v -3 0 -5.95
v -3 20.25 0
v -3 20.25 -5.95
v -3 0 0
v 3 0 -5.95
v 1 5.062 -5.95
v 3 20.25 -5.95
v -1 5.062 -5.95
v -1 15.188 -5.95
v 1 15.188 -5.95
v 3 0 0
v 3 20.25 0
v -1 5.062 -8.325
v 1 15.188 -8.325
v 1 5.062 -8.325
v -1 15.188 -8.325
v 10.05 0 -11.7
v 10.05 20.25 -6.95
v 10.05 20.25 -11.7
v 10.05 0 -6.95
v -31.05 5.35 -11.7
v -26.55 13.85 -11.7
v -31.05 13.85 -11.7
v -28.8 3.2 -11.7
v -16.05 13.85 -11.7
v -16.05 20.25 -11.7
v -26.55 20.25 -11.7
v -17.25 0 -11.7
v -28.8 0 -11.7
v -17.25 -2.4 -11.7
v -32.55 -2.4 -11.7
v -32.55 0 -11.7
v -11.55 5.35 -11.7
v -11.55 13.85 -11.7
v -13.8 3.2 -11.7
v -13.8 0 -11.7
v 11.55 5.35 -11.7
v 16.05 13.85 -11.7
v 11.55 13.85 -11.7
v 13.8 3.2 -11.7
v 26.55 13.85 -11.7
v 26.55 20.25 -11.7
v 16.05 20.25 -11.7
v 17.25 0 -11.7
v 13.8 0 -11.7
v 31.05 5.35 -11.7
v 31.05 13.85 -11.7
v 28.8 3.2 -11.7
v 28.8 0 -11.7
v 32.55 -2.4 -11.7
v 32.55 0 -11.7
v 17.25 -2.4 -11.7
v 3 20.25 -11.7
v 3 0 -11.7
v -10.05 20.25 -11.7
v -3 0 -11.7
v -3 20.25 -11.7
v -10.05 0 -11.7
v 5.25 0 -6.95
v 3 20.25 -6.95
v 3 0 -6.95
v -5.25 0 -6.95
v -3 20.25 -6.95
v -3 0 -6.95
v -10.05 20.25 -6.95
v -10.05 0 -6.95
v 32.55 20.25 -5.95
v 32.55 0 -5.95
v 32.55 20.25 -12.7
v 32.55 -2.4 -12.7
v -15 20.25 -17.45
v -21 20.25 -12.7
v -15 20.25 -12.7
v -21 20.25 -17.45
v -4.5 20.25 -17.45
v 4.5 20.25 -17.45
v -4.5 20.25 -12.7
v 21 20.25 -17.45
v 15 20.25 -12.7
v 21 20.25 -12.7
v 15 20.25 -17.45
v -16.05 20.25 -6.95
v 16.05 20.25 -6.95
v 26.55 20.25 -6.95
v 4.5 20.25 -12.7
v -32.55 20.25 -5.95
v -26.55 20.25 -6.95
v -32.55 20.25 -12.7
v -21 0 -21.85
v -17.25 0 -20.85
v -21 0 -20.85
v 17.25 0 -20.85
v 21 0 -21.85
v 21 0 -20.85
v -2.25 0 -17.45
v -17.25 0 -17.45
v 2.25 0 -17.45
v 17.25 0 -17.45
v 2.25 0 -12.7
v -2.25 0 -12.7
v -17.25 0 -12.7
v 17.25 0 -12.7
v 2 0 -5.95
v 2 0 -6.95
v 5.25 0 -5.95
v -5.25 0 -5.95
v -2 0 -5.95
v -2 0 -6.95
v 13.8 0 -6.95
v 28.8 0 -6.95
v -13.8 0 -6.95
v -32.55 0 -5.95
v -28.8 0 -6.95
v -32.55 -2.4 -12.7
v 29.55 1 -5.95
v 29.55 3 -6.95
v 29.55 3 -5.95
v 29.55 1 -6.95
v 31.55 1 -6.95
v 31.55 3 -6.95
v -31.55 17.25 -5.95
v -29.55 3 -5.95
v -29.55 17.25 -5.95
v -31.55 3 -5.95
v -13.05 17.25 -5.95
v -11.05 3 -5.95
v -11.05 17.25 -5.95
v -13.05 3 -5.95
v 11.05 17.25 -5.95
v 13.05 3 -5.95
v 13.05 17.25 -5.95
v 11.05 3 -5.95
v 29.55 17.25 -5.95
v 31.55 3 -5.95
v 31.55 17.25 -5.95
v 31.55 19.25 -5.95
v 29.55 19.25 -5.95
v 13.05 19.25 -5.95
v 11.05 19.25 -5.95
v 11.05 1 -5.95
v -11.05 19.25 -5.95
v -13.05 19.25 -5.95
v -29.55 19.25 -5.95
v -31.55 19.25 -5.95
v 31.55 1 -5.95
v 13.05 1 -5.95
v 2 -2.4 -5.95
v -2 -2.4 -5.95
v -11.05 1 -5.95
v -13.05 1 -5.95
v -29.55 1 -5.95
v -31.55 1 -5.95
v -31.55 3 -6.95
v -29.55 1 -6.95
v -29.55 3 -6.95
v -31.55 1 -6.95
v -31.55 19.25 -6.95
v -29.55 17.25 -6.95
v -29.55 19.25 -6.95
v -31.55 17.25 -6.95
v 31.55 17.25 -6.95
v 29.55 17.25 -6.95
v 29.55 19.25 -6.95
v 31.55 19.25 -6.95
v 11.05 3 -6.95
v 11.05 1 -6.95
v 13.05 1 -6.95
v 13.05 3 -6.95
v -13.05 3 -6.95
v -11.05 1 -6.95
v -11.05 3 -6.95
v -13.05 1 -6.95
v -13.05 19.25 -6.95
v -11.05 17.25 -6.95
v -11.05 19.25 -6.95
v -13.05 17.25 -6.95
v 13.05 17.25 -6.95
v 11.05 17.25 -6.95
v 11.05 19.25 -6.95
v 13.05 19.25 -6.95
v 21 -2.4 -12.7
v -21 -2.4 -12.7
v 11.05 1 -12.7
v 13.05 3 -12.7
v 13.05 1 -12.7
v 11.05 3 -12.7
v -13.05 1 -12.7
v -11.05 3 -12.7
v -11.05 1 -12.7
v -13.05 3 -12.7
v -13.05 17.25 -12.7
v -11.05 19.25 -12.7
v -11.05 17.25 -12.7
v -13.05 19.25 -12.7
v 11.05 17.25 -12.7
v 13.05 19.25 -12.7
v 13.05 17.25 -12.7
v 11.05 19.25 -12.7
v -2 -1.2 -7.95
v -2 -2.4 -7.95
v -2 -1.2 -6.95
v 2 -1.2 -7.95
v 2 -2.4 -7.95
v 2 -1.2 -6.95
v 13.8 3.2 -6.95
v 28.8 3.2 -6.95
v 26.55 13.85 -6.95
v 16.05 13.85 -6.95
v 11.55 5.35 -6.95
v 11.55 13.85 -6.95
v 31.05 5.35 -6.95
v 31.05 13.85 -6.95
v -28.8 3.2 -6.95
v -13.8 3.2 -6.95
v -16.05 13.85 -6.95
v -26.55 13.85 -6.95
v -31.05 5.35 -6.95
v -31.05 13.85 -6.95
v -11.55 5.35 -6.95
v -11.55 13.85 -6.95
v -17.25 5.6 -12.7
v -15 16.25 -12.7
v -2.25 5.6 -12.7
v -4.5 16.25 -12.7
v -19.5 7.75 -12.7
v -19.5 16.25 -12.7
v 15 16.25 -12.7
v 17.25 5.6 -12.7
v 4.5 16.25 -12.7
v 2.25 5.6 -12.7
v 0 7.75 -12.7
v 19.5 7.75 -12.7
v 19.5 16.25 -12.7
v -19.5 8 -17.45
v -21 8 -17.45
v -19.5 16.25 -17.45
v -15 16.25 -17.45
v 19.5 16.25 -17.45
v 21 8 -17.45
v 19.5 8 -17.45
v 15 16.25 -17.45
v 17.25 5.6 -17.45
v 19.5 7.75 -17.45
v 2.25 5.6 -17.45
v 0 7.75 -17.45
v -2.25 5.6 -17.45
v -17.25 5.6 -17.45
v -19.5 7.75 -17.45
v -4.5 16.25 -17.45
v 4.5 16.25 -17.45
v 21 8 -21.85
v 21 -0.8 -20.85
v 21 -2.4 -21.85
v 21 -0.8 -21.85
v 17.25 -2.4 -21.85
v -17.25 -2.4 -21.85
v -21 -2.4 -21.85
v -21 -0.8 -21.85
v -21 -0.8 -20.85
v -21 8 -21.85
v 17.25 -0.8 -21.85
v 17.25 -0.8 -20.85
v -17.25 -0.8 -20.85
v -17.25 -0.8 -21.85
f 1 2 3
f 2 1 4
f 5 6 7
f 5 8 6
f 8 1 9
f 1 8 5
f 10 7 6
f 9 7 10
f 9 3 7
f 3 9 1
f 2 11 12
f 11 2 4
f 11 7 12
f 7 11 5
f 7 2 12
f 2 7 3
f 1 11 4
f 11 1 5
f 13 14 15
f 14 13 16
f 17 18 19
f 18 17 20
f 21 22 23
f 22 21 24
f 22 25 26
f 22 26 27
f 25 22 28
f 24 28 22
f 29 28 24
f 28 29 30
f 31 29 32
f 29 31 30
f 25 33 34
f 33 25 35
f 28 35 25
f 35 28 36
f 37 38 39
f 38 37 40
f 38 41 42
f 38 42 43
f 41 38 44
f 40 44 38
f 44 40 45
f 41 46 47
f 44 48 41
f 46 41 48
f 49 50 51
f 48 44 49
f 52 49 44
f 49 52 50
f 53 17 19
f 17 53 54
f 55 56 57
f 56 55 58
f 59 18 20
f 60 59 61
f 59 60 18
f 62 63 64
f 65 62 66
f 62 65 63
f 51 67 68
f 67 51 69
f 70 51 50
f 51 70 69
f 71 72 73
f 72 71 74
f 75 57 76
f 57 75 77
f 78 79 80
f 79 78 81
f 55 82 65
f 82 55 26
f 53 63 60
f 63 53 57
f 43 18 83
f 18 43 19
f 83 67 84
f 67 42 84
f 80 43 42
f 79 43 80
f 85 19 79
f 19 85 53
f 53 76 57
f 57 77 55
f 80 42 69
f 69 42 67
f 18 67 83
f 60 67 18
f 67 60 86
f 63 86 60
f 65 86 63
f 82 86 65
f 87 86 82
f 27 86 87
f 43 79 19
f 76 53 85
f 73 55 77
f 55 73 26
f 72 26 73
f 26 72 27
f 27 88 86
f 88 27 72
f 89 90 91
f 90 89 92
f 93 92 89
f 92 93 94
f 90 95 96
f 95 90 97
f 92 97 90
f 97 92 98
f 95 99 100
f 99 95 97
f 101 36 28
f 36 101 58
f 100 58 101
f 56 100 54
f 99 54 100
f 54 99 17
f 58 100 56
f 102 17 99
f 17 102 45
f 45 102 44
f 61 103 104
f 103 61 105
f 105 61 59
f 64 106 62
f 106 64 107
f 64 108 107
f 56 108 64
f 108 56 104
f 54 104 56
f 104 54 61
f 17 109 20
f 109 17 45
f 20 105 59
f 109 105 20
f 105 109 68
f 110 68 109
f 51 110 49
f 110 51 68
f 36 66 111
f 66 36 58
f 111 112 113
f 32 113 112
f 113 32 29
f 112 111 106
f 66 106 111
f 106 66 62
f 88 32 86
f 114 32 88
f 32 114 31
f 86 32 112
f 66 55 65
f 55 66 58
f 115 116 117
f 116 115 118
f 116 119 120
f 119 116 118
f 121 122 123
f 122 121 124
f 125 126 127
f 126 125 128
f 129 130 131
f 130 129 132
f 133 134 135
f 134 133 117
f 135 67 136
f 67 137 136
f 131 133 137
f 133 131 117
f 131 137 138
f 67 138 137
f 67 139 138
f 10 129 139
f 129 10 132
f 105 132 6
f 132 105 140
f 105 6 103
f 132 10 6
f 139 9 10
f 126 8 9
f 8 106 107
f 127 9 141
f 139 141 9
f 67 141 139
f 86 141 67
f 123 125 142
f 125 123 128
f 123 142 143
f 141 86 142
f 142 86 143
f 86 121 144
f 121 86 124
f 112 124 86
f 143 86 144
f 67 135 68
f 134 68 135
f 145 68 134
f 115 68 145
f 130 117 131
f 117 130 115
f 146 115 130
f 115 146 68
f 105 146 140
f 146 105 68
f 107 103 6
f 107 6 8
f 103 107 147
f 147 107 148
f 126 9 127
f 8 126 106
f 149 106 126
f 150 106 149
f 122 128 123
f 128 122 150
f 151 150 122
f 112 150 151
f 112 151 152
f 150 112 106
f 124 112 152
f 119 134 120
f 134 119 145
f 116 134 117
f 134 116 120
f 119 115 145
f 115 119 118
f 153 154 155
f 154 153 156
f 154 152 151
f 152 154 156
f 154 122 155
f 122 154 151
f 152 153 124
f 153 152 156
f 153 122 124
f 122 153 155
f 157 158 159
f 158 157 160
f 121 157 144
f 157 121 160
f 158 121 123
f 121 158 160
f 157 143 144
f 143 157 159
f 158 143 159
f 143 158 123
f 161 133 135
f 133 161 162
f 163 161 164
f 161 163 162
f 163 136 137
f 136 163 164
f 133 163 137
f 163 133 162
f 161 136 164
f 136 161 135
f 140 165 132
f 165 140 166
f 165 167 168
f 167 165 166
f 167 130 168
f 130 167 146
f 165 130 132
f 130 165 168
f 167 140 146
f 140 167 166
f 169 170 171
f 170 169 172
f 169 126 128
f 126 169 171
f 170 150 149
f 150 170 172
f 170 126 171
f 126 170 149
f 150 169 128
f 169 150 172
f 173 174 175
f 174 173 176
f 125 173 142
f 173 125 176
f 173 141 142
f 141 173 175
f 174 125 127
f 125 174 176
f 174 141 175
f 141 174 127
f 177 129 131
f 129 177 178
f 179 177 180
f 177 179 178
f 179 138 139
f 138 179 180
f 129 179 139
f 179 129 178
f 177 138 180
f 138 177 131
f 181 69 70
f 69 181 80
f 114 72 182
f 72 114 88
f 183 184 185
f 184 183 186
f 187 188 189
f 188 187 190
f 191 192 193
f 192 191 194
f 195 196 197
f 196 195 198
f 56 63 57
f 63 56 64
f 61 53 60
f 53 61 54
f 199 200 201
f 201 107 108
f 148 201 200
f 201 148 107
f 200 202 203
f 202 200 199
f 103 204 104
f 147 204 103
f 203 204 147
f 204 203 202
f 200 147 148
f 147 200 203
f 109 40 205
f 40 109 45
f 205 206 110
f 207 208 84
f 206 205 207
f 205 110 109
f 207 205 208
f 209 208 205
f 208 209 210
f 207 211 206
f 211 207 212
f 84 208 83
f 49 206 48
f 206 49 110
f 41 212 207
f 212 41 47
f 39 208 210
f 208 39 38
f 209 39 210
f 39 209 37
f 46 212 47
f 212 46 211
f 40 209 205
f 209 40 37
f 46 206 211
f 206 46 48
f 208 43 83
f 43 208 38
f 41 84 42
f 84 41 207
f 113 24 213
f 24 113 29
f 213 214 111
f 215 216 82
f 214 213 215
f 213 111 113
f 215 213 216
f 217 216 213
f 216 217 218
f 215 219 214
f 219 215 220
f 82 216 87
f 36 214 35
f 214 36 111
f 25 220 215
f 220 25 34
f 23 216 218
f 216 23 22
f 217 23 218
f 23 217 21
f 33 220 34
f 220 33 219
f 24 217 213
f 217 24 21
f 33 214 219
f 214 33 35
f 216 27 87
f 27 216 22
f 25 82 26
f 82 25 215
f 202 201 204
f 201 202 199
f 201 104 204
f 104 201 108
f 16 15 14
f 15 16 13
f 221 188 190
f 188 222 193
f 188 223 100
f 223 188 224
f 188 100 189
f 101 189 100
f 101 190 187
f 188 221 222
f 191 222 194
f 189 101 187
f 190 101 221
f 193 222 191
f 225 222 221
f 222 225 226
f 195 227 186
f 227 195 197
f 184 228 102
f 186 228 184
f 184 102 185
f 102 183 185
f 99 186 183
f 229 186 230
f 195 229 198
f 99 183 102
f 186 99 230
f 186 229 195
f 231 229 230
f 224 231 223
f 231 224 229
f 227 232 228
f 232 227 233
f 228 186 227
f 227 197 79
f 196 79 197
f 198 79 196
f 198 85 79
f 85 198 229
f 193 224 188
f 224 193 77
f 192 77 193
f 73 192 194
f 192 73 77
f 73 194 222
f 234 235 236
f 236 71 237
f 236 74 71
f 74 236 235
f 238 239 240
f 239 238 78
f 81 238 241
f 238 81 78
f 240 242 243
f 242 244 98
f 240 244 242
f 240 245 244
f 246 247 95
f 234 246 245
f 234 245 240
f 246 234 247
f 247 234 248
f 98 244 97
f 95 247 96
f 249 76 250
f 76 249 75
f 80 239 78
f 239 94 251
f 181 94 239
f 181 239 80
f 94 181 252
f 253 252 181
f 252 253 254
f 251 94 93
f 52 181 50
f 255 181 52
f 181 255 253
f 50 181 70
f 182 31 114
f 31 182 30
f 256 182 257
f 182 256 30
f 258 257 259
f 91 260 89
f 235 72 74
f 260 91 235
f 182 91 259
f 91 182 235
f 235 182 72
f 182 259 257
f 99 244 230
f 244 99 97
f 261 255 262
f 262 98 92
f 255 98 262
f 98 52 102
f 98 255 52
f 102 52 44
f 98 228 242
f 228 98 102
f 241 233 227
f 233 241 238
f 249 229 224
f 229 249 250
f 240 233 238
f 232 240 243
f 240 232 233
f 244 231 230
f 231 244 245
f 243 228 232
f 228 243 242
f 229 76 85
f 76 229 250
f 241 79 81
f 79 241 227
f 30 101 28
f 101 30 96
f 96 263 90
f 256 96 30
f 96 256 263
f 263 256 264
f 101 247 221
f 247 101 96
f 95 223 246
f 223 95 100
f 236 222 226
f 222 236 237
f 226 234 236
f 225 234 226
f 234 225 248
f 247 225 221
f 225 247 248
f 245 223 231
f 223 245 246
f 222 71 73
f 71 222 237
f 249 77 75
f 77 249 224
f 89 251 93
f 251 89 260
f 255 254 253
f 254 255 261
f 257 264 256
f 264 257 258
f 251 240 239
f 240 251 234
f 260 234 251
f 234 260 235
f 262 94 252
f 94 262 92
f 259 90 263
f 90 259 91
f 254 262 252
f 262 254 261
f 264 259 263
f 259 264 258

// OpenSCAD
// file: _constants.scad
// 8th-gen NUC
// https://www.intel.com/content/dam/support/us/en/documents/mini-pcs/nuc-kits/NUC8i3BE_NUC8i5BE_NUC8i7BE_TechProdSpec.pdf
mobo_screw_distance_x = 95.0;
mobo_screw_distance_y = 90.4;
chassis_width = 117;
chassis_depth = 112;
chassis_bottom_width = 112.5;
chassis_bottom_depth = 108.5;
chassis_outer_radius = 7;
chassis_inner_radius = 7;
chassis_bolt_diameter_1 = 5;
chassis_bolt_diameter_2 = 6.5;
chassis_bolt_diameter_3 = 8;
// distance from widest part of bolt (without rubber feet) to where the bottom plate rests
chassis_bolt_offset = 2;
center_column_width = 10.5;
chassis_thickness_1 = 0.8;
chassis_thickness_2 = chassis_thickness_1*1.5; // around the trapezoidal hole
opening_width_1 = 27.3;
opening_width_2 = 25.6;
opening_height = 14.45;
opening_offset_z = -3.4;
opening_to_bottom = 6.45;
interior_depth = 106.5 -1;
sodimm_to_chassis = 8;

// HDMI jack boards
board_width = 33.6;
board_depth = 30;
board_height = 1.65;
board_ribbon_width = 11;
board_ribbon_length = 4; // portion that can't be bent
plug_width = 15.2;
plug_depth = 11.5;
plug_height = 6.25;
plug_offset = 10.85;
plug_chassis_gap = 2;
plug_solder_width = 2.5;
plug_solder_depth = 12;
plug_solder_height = 0.75;
screw_offset_x = 4.2;
screw_offset_y = 4;
screw_distance_x = board_width - screw_offset_x * 2;
screw_distance_y = board_depth - screw_offset_y * 2;
screw_diameter = 3;
// main file
include <_constants.scad>;

// DIY HDMI Cable Parts - Straight Micro HDMI Socket Adapter
// https://www.adafruit.com/product/3559
socket_width_1 = 15;
socket_width_2 = 19.5;
socket_narrow_length = 5.6;
socket_wide_length = 8.5;
socket_ribbon_width = 10.5;
socket_depth = 16.25;
socket_height = 4.75;

// Variables
chassis_overhang = chassis_thickness_1*3;
mount_panel_thickness = 1;
socket_padding_x = 1.5;
socket_padding_y = 4;
mount_panel_width_1 = center_column_width + opening_width_1*2;
mount_panel_width_2 = socket_width_2*2 + socket_padding_x*2;
mount_panel_depth = socket_depth + socket_padding_y;
footer_height = opening_to_bottom - mount_panel_thickness/2;
panel_height = mount_panel_thickness + socket_height;
peg_size = 2;

module socket() {
  union() {
    // narrow end
    translate([-socket_width_1/2, 0, 0]) {
      cube([socket_width_1, socket_depth, socket_height]);
    }

    // wide end
    translate([-socket_width_2/2, socket_depth - socket_wide_length, 0]) {
      cube([socket_width_2, socket_wide_length, socket_height]);
    }

    linear_extrude(socket_height) {
      x1 = socket_width_1/2;
      y1 = socket_narrow_length;
      x2 = socket_width_2/2;
      y2 = socket_depth - socket_wide_length;
      polygon(points=[
        [-x1,y1],
        [x1,y1],
        [x2,y2],
        [-x2,y2],
      ]);
    }

    // cable
    translate([-socket_ribbon_width/2, 0, 0]) {
      cube([socket_ribbon_width, socket_depth*2, socket_height]);
    }
  }
}

module socket_shell(depth=mount_panel_depth) {
  width = socket_width_2 + socket_padding_x*2;
  translate([-width/2, 0, 0]) {
    cube([width, depth, socket_height]);
  }
}

module peg_1() {
  translate([-peg_size/2, mount_panel_depth/4, 0]) {
    cube([peg_size, mount_panel_depth/2, socket_height/2]);
  }
}

module peg_2() {
  translate([-peg_size/2, sodimm_to_chassis/4, 0]) {
    cube([peg_size, sodimm_to_chassis/2, socket_height/2]);
  }
}

module corner_peg() {
  translate([peg_size/2, peg_size/2, 0]) {
    cube([peg_size, peg_size, mount_panel_thickness]);
  }
}

module corner_pegs(width=mount_panel_width_1) {
  translate([-width/2, 0, 0]) {
    corner_peg();
  }
  translate([width/2, 0, 0]) {
    rotate([0, 0, 90]) corner_peg();
  }
  translate([width/2, mount_panel_depth, 0]) {
    rotate([0, 0, 180]) corner_peg();
  }
  translate([-width/2, mount_panel_depth, 0]) {
    rotate([0, 0, 270]) corner_peg();
  }
}

module center_column(width=center_column_width, depth=interior_depth) {
  translate([0, -depth/2, 0]) {
    cube([width, depth, interior_depth], center=true);
  }
}

module lip() {
  translate([-interior_depth, 0, 0]) {
    rotate([180, 0, 0]) cube([interior_depth*2, chassis_thickness_1, interior_depth], center=false);
  }
}

module footer() {
  width = peg_size*3;
  translate([-width/2, 0, 0]) {
    cube([width, mount_panel_depth, footer_height]);
  }
  translate([0, 0, footer_height]) {
    peg_1();
  }
}

module panel_1() {
  offset = mount_panel_width_1/2 - socket_padding_x - socket_width_2/2;
  hole_width = 4;
  difference() {
    union() {
      for (x = [-offset, offset]) {
        translate([x, 0, mount_panel_thickness]) {
          socket_shell();
        }
      }
      translate([-mount_panel_width_1/2, 0, 0]) {
        cube([mount_panel_width_1, mount_panel_depth, mount_panel_thickness]);
      }
      translate([0, 0, panel_height]) {
        corner_pegs();
        corner_pegs(mount_panel_width_1 - socket_width_2*2 - socket_padding_x*4 + peg_size*4);
      }

      // Hook into that little trapezoidal hole
      center_width = peg_size*3;
      translate([-center_width/2, 0, 0]) {
        cube([center_width, mount_panel_depth, panel_height]);
      }
      translate([-hole_width/2, -chassis_overhang, 0]) {
        cube([hole_width, mount_panel_depth + chassis_overhang, mount_panel_thickness*2]);
      }
    }
    for (x = [-offset, offset]) {
      translate([x, -chassis_overhang, mount_panel_thickness]) {
        socket();
      }
    }
    difference() {
      center_column(depth=chassis_thickness_2);
      translate([-hole_width/2, 0, 0]) {
        mirror([0, 1, 0]) cube([hole_width, 100, 1]);
      }
    }
    peg_1();
    corner_pegs();
    corner_pegs(mount_panel_width_1 - socket_width_2*2 - socket_padding_x*4 + peg_size*4);
  }
}

module panel_2() {
  offset = socket_width_2/2;
  difference() {
    union() {
      for (x = [-offset, offset]) {
        translate([x, -chassis_overhang, mount_panel_thickness]) {
          socket_shell(mount_panel_depth + chassis_overhang);
        }
      }
      translate([-mount_panel_width_1/2, -chassis_overhang, 0]) {
        cube([mount_panel_width_1, mount_panel_depth + chassis_overhang, mount_panel_thickness]);
      }
      translate([0, 0, panel_height]) {
        peg_2();
        difference() {
          corner_pegs(mount_panel_width_2);
          translate([0, mount_panel_depth, 0]) {
            cube([mount_panel_width_2, mount_panel_depth, panel_height*2], center=true);
          }
        }
      }
    }
    for (x = [-offset, offset]) {
      translate([x, 0, mount_panel_thickness]) {
        socket();
      }
    }
    center_column(socket_width_1 + socket_width_2);
    corner_pegs();
    corner_pegs(mount_panel_width_1 - socket_width_2*2 - socket_padding_x*4 + peg_size*4);
  }
}

module topper() {
  difference() {
    translate([-mount_panel_width_2/2, -chassis_overhang, 0]) {
      cube([
        mount_panel_width_2,
        sodimm_to_chassis + chassis_overhang,
        -opening_offset_z + mount_panel_thickness,
      ]);
    }
    peg_2();
    corner_pegs(mount_panel_width_2);
    center_column(socket_width_1 + socket_width_2);
    translate([0, 0, -opening_offset_z]) {
      mirror([0, 0, 1]) lip();
    }
  }
}

module arrange(spacing = 0) {
  footer();

  translate([0, 0, footer_height + spacing]) {
    panel_1();

    translate([0, 0, panel_height + spacing]) {
      panel_2();

      translate([0, 0, panel_height + spacing]) {
        topper();
      }
    }
  }
}

rotate([0, 180, 0]) arrange(0);
